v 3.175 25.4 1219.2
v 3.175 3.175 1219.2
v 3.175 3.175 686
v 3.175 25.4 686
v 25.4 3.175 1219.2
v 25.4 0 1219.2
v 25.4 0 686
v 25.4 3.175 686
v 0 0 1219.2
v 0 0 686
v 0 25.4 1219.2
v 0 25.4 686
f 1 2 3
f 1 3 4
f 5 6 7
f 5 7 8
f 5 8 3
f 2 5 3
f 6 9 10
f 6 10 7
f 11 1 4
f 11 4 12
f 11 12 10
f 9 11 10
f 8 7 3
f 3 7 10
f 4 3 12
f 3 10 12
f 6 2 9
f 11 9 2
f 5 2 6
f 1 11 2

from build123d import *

# Parameters (mm, degrees)
BOSS_EXTRUDE1_DEPTH = 1219.2
FILLET1_R           = 0.4064
SKETCH4_W           = 1905.2
SKETCH4_H           = 103.278519729
CUT_EXTRUDE1_DEPTH  = 60
SKETCH5_W           = 2.47699065
SKETCH5_H           = 2.94685794
CUT_EXTRUDE2_DEPTH  = 600


with BuildPart() as part:
    # Sketch3 → Boss-Extrude1 (new, symmetric)
    with BuildSketch(Plane.XY):
        Polygon((3.175, 25.4), (0, 25.4), (0, 0), (25.4, 0), (25.4, 3.175), (3.175, 3.175), align=None)
    extrude(amount=BOSS_EXTRUDE1_DEPTH, both=True)

    # Fillet1
    fillet1_edges = [part.edges().sort_by_distance(p)[0] for p in [
        (3.175, 3.175, 0),
    ]]
    fillet(fillet1_edges, radius=FILLET1_R)

    # Sketch4 → Cut-Extrude1 (cut)
    with BuildSketch(Plane.ZY):
        with Locations((-266.6, -26.239259864)):
            Rectangle(SKETCH4_W, SKETCH4_H)
    extrude(amount=-CUT_EXTRUDE1_DEPTH, mode=Mode.SUBTRACT)

    # Sketch5 → Cut-Extrude2 (cut)
    with BuildSketch(Plane(origin=(0, 0, 686), x_dir=(-1, 0, 0), z_dir=(0, 0, -1))):
        with Locations((-4.413495325, 4.64842897)):
            Rectangle(SKETCH5_W, SKETCH5_H)
    extrude(amount=-CUT_EXTRUDE2_DEPTH, mode=Mode.SUBTRACT)


solid = part.part
